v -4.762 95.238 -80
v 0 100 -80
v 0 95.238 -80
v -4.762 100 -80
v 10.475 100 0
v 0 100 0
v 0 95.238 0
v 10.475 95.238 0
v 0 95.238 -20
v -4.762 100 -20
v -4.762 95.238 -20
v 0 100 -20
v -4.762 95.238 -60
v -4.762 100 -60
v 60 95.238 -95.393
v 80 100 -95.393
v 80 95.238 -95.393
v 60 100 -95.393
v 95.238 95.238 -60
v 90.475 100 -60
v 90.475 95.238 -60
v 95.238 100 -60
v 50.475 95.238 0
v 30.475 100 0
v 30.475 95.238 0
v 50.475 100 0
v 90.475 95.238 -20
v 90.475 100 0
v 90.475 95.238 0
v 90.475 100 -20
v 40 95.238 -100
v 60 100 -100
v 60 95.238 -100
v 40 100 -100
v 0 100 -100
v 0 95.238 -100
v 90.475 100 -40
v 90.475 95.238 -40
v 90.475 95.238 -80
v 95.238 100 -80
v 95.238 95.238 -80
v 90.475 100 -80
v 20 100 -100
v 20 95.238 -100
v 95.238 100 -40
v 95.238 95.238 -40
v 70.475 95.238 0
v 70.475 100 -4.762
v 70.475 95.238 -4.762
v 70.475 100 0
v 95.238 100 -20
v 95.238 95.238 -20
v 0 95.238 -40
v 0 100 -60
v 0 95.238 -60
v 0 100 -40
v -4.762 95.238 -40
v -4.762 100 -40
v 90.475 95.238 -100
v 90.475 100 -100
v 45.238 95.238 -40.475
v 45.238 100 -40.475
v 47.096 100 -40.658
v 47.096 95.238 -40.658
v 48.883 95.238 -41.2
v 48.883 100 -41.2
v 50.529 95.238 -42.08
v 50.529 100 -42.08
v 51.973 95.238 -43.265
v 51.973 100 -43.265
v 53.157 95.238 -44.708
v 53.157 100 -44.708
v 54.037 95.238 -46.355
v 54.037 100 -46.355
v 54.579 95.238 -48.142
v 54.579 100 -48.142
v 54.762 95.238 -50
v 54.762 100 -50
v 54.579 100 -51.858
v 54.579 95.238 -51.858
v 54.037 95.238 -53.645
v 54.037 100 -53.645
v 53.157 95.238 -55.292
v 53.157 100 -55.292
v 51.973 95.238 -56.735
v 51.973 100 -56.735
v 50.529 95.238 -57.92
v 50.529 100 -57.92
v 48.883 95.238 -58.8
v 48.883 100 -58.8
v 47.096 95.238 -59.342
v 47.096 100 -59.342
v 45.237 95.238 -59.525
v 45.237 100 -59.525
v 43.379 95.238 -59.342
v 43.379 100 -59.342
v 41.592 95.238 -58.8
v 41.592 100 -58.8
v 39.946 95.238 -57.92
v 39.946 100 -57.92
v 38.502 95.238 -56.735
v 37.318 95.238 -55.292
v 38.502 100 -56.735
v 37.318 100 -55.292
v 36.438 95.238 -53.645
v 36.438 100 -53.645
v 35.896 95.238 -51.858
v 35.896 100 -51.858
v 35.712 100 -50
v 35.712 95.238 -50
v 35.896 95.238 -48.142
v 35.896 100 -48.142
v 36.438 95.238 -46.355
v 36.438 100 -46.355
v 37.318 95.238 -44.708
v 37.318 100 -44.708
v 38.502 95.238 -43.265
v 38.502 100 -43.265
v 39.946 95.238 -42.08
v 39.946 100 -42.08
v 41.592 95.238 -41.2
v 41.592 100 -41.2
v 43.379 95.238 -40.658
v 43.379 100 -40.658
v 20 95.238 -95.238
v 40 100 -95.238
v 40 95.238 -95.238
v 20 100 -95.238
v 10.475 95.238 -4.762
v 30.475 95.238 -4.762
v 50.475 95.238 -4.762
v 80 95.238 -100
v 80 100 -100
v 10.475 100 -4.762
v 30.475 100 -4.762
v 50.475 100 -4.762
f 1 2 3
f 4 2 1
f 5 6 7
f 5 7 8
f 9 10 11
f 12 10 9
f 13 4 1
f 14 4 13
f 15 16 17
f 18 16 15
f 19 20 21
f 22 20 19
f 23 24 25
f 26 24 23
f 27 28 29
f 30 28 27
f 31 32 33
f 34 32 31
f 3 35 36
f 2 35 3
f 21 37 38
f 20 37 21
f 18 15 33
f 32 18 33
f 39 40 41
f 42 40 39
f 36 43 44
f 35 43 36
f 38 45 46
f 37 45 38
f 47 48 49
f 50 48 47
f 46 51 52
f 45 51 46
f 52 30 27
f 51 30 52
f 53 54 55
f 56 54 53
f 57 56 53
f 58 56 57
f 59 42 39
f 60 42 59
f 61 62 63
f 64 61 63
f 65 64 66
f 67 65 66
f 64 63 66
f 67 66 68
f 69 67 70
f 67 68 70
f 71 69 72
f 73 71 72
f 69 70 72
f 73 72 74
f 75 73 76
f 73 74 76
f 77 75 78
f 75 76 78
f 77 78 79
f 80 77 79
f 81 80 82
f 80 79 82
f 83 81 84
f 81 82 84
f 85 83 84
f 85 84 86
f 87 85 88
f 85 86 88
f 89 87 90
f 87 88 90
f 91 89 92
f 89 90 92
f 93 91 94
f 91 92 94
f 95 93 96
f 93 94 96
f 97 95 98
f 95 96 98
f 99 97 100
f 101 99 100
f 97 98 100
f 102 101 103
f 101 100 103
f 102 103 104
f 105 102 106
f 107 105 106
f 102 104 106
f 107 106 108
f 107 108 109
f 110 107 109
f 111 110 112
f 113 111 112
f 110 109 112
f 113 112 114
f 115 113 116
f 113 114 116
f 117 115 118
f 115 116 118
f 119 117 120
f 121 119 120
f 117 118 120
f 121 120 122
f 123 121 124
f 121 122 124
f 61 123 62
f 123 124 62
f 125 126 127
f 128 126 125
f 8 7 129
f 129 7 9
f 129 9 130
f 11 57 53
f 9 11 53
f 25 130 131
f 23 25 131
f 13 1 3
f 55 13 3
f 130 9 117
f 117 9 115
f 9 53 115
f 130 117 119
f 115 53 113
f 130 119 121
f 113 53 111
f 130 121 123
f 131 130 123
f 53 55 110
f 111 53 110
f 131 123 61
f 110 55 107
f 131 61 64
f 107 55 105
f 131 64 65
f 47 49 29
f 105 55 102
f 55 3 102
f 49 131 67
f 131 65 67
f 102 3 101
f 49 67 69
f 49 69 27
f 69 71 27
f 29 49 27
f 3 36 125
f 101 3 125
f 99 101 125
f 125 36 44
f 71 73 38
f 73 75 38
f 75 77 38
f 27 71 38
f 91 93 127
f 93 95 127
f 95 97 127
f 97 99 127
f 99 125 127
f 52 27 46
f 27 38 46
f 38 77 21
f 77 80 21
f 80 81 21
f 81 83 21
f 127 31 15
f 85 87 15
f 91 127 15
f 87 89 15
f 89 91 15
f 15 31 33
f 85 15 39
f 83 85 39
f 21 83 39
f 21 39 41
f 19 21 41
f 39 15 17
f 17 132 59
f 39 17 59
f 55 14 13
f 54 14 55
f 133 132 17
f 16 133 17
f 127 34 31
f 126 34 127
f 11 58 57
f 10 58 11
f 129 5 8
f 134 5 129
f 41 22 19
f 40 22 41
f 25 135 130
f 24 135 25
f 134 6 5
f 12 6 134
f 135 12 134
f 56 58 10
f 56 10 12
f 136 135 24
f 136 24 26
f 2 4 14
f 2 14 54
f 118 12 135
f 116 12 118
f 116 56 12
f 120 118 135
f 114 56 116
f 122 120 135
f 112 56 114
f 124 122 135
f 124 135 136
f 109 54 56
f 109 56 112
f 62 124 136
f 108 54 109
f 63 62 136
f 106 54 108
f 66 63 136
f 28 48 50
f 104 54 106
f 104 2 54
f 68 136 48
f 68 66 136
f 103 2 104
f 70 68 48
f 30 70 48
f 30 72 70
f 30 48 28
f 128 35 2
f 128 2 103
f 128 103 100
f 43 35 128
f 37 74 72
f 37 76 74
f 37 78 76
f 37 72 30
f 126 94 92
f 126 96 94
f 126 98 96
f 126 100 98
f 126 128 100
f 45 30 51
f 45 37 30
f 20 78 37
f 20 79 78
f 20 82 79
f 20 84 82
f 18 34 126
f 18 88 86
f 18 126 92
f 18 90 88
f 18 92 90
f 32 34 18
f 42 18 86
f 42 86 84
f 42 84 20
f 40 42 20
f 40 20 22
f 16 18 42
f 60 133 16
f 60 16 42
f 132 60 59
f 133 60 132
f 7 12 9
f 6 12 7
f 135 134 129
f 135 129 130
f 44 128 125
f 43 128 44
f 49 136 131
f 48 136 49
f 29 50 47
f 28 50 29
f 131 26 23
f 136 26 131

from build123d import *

# Parameters (mm, degrees)
BOSS_EXTRUDE1_DEPTH = 4.7625
SKETCH3_R           = 9.525
CUT_EXTRUDE1_DEPTH  = 4.7625


with BuildPart() as part:
    # Sketch2 → Boss-Extrude1 (new body)
    with BuildSketch(Plane(origin=(0, 100, 0), x_dir=(1, 0, 0), z_dir=(0, 1, 0))):
        Polygon((80, 100), (80, 95.392875), (60, 95.392875), (60, 100), (40, 100), (40, 95.2375), (20, 95.2375), (20, 100), (0, 100), (0, 80), (-4.7625, 80), (-4.7625, 60), (0, 60), (0, 40), (-4.7625, 40), (-4.7625, 20), (0, 20), (0, 0), (10.475, 0), (10.475, 4.7625), (30.475, 4.7625), (30.475, 0), (50.475, 0), (50.475, 4.7625), (70.475, 4.7625), (70.475, 0), (90.475, 0), (90.475, 20), (95.2375, 20), (95.2375, 40), (90.475, 40), (90.475, 60), (95.2375, 60), (95.2375, 80), (90.475, 80), (90.475, 100), align=None)
    extrude(amount=-BOSS_EXTRUDE1_DEPTH)

    # Sketch3 → Cut-Extrude1 (cut)
    with BuildSketch(Plane(origin=(0, 100, 0), x_dir=(1, 0, 0), z_dir=(0, 1, 0))):
        with Locations(Location((45.2375, 50, 0), (0, 0, 270))):
            Circle(SKETCH3_R)
    extrude(amount=-CUT_EXTRUDE1_DEPTH, mode=Mode.SUBTRACT)


solid = part.part
